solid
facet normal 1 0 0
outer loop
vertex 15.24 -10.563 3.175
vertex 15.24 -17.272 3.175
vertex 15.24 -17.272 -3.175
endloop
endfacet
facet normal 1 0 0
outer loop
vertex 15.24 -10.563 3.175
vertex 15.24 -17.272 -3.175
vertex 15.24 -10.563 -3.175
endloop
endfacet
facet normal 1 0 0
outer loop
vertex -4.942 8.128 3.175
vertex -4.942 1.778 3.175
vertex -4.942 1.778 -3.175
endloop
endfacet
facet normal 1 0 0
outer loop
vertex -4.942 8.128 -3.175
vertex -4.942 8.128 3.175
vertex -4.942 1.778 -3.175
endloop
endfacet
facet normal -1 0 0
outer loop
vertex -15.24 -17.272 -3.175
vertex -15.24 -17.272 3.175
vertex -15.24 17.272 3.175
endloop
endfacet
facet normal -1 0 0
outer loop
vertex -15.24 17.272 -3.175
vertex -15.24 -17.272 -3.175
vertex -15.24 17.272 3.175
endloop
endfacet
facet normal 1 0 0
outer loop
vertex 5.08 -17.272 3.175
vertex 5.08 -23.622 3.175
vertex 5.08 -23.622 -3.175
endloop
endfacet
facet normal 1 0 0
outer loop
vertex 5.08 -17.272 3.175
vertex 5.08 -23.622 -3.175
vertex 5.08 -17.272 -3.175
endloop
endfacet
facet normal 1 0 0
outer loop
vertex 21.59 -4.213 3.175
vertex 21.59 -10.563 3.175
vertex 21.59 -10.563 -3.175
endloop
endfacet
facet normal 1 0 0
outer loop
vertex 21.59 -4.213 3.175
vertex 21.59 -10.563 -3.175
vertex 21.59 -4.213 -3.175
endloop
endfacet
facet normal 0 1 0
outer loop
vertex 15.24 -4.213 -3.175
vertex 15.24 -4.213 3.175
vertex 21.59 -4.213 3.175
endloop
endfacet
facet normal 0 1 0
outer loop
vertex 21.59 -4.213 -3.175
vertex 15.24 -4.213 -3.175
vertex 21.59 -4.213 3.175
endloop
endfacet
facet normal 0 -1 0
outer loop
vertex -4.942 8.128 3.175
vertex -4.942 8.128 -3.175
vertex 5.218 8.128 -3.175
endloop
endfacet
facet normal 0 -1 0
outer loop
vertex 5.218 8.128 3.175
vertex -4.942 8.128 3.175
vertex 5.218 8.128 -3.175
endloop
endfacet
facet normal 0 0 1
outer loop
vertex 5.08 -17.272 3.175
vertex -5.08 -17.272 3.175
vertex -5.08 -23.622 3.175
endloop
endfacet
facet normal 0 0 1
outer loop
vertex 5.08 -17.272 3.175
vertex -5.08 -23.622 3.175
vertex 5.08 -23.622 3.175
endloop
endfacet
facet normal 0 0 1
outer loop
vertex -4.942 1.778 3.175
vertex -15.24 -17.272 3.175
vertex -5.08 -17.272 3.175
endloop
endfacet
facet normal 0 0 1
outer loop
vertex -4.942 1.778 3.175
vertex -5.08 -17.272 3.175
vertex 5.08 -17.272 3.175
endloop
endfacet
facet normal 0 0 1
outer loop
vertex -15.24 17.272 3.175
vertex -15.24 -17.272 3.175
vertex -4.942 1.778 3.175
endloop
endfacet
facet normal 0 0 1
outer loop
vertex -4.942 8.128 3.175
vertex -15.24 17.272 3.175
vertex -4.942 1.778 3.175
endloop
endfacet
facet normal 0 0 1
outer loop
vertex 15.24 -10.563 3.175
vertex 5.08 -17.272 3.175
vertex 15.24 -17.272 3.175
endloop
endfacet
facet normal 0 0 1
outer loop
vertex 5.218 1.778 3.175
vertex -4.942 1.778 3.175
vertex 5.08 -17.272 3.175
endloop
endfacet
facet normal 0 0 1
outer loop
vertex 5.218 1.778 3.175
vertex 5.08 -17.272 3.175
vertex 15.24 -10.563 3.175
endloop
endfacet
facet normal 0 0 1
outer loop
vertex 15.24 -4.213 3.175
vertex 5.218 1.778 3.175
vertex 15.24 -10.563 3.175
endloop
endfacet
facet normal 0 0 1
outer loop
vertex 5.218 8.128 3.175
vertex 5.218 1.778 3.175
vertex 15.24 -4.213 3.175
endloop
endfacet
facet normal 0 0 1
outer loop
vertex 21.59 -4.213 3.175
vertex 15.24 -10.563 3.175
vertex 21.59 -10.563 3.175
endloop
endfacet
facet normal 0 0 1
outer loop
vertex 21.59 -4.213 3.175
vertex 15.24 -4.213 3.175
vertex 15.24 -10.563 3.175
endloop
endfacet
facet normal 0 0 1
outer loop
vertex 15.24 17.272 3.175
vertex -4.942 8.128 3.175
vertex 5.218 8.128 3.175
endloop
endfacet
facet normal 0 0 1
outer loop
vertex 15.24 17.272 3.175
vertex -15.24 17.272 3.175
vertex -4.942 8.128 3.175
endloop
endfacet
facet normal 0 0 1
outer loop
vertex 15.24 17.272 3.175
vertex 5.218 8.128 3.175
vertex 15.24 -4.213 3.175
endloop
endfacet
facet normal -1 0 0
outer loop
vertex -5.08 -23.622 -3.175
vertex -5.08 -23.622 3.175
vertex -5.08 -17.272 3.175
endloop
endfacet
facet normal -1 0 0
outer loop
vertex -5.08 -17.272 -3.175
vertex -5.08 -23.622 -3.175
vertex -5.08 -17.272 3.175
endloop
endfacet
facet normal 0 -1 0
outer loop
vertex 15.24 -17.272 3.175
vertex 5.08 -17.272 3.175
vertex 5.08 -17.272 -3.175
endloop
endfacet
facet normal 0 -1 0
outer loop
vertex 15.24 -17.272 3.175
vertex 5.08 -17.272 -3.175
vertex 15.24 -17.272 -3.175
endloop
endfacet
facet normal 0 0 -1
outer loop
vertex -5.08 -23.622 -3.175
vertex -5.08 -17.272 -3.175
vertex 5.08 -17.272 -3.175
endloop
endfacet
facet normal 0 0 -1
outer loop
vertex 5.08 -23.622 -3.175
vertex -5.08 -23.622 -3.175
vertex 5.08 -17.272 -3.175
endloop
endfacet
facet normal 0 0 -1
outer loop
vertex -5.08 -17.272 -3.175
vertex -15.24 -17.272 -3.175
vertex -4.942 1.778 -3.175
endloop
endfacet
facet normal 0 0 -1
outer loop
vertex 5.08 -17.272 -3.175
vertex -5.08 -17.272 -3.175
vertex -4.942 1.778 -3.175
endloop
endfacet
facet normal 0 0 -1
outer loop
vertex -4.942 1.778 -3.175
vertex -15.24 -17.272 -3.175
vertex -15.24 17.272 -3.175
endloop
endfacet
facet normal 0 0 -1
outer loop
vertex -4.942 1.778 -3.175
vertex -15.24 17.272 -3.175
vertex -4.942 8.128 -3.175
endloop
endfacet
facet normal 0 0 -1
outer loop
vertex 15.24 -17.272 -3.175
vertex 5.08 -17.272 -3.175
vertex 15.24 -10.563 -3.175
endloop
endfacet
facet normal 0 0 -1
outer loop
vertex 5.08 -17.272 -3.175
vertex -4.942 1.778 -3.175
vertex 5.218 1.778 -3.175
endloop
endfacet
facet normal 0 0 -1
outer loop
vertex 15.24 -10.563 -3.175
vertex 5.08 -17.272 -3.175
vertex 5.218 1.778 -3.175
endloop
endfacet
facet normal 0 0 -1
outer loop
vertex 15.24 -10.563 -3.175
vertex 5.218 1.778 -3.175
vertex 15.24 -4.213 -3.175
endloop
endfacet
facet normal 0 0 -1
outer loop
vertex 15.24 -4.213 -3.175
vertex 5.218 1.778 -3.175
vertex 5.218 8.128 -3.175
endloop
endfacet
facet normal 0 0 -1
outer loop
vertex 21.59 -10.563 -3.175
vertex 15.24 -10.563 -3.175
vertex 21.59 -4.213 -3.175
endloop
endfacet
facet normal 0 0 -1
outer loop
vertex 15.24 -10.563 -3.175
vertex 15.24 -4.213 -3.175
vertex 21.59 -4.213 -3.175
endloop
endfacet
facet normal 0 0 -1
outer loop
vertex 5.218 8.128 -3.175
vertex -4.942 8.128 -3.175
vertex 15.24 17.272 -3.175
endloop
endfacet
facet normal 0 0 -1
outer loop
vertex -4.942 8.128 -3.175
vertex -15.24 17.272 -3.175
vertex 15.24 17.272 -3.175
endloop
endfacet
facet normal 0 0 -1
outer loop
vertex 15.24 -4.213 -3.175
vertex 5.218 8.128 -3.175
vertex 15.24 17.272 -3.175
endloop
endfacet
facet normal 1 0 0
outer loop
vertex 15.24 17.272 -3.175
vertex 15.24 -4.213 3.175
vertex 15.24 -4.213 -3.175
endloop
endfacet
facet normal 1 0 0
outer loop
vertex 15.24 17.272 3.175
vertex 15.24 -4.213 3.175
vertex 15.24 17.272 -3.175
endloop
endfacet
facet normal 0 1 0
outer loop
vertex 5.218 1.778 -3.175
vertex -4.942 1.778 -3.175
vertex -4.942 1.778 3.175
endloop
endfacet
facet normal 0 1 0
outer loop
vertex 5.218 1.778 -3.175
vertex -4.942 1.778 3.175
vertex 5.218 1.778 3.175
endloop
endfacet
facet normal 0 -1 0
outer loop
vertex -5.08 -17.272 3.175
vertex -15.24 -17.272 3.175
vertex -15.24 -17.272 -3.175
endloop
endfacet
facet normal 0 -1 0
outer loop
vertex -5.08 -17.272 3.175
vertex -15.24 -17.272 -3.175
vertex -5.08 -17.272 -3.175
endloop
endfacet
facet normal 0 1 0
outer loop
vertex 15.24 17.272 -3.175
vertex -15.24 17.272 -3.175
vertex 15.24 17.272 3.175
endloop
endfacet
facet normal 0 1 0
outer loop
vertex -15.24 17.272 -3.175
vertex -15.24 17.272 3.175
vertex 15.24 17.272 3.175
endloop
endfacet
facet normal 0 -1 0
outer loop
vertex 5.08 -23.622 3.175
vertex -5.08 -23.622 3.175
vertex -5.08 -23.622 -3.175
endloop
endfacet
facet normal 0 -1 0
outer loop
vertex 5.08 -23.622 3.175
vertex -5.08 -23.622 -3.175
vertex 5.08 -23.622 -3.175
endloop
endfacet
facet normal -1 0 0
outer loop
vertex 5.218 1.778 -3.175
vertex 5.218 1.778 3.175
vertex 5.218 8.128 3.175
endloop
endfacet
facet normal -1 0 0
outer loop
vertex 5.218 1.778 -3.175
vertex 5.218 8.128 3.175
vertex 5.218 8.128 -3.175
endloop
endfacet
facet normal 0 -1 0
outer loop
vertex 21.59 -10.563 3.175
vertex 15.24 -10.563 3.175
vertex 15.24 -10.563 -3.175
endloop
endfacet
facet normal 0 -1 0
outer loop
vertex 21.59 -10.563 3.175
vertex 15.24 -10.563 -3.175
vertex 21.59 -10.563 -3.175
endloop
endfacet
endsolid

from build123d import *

# Parameters (mm, degrees)
SKETCH1_W           = 30.48
SKETCH1_H           = 34.544
BOSS_EXTRUDE1_DEPTH = 3.175
SKETCH2_W           = 6.35
SKETCH2_H           = 6.35
BOSS_EXTRUDE2_DEPTH = 6.35
SKETCH5_W           = 10.16
SKETCH5_H           = 6.35
BOSS_EXTRUDE4_DEPTH = 6.35
CAVITY1_START       = 1.778
CAVITY1_OUTLINE_W   = 10.16
CAVITY1_OUTLINE_H   = 6.35
CAVITY1_DEPTH       = 6.35


# Read off the part's stored shape, not the designer's step: Cavity1
with BuildPart() as part:
    # Sketch1 → Boss-Extrude1 (new, symmetric)
    with BuildSketch(Plane.XY):
        Rectangle(SKETCH1_W, SKETCH1_H)
    extrude(amount=BOSS_EXTRUDE1_DEPTH, both=True)

    # Sketch2 → Boss-Extrude2 (add)
    with BuildSketch(Plane.XY.offset(3.175)):
        with Locations((18.415, -7.387912323)):
            Rectangle(SKETCH2_W, SKETCH2_H)
    extrude(amount=-BOSS_EXTRUDE2_DEPTH)

    # Sketch5 → Boss-Extrude4 (add)
    with BuildSketch(Plane.XY.offset(3.175)):
        with Locations((0, -20.447)):
            Rectangle(SKETCH5_W, SKETCH5_H)
    extrude(amount=-BOSS_EXTRUDE4_DEPTH)

    # Cavity1 outline → Cavity1 (cut)
    with BuildSketch(Plane(origin=(0, 0, 0), x_dir=(1, 0, 0), z_dir=(0, 1, 0)).offset(CAVITY1_START)):
        with Locations((0.138449205, 0)):
            Rectangle(CAVITY1_OUTLINE_W, CAVITY1_OUTLINE_H)
    extrude(amount=CAVITY1_DEPTH, mode=Mode.SUBTRACT)


solid = part.part
